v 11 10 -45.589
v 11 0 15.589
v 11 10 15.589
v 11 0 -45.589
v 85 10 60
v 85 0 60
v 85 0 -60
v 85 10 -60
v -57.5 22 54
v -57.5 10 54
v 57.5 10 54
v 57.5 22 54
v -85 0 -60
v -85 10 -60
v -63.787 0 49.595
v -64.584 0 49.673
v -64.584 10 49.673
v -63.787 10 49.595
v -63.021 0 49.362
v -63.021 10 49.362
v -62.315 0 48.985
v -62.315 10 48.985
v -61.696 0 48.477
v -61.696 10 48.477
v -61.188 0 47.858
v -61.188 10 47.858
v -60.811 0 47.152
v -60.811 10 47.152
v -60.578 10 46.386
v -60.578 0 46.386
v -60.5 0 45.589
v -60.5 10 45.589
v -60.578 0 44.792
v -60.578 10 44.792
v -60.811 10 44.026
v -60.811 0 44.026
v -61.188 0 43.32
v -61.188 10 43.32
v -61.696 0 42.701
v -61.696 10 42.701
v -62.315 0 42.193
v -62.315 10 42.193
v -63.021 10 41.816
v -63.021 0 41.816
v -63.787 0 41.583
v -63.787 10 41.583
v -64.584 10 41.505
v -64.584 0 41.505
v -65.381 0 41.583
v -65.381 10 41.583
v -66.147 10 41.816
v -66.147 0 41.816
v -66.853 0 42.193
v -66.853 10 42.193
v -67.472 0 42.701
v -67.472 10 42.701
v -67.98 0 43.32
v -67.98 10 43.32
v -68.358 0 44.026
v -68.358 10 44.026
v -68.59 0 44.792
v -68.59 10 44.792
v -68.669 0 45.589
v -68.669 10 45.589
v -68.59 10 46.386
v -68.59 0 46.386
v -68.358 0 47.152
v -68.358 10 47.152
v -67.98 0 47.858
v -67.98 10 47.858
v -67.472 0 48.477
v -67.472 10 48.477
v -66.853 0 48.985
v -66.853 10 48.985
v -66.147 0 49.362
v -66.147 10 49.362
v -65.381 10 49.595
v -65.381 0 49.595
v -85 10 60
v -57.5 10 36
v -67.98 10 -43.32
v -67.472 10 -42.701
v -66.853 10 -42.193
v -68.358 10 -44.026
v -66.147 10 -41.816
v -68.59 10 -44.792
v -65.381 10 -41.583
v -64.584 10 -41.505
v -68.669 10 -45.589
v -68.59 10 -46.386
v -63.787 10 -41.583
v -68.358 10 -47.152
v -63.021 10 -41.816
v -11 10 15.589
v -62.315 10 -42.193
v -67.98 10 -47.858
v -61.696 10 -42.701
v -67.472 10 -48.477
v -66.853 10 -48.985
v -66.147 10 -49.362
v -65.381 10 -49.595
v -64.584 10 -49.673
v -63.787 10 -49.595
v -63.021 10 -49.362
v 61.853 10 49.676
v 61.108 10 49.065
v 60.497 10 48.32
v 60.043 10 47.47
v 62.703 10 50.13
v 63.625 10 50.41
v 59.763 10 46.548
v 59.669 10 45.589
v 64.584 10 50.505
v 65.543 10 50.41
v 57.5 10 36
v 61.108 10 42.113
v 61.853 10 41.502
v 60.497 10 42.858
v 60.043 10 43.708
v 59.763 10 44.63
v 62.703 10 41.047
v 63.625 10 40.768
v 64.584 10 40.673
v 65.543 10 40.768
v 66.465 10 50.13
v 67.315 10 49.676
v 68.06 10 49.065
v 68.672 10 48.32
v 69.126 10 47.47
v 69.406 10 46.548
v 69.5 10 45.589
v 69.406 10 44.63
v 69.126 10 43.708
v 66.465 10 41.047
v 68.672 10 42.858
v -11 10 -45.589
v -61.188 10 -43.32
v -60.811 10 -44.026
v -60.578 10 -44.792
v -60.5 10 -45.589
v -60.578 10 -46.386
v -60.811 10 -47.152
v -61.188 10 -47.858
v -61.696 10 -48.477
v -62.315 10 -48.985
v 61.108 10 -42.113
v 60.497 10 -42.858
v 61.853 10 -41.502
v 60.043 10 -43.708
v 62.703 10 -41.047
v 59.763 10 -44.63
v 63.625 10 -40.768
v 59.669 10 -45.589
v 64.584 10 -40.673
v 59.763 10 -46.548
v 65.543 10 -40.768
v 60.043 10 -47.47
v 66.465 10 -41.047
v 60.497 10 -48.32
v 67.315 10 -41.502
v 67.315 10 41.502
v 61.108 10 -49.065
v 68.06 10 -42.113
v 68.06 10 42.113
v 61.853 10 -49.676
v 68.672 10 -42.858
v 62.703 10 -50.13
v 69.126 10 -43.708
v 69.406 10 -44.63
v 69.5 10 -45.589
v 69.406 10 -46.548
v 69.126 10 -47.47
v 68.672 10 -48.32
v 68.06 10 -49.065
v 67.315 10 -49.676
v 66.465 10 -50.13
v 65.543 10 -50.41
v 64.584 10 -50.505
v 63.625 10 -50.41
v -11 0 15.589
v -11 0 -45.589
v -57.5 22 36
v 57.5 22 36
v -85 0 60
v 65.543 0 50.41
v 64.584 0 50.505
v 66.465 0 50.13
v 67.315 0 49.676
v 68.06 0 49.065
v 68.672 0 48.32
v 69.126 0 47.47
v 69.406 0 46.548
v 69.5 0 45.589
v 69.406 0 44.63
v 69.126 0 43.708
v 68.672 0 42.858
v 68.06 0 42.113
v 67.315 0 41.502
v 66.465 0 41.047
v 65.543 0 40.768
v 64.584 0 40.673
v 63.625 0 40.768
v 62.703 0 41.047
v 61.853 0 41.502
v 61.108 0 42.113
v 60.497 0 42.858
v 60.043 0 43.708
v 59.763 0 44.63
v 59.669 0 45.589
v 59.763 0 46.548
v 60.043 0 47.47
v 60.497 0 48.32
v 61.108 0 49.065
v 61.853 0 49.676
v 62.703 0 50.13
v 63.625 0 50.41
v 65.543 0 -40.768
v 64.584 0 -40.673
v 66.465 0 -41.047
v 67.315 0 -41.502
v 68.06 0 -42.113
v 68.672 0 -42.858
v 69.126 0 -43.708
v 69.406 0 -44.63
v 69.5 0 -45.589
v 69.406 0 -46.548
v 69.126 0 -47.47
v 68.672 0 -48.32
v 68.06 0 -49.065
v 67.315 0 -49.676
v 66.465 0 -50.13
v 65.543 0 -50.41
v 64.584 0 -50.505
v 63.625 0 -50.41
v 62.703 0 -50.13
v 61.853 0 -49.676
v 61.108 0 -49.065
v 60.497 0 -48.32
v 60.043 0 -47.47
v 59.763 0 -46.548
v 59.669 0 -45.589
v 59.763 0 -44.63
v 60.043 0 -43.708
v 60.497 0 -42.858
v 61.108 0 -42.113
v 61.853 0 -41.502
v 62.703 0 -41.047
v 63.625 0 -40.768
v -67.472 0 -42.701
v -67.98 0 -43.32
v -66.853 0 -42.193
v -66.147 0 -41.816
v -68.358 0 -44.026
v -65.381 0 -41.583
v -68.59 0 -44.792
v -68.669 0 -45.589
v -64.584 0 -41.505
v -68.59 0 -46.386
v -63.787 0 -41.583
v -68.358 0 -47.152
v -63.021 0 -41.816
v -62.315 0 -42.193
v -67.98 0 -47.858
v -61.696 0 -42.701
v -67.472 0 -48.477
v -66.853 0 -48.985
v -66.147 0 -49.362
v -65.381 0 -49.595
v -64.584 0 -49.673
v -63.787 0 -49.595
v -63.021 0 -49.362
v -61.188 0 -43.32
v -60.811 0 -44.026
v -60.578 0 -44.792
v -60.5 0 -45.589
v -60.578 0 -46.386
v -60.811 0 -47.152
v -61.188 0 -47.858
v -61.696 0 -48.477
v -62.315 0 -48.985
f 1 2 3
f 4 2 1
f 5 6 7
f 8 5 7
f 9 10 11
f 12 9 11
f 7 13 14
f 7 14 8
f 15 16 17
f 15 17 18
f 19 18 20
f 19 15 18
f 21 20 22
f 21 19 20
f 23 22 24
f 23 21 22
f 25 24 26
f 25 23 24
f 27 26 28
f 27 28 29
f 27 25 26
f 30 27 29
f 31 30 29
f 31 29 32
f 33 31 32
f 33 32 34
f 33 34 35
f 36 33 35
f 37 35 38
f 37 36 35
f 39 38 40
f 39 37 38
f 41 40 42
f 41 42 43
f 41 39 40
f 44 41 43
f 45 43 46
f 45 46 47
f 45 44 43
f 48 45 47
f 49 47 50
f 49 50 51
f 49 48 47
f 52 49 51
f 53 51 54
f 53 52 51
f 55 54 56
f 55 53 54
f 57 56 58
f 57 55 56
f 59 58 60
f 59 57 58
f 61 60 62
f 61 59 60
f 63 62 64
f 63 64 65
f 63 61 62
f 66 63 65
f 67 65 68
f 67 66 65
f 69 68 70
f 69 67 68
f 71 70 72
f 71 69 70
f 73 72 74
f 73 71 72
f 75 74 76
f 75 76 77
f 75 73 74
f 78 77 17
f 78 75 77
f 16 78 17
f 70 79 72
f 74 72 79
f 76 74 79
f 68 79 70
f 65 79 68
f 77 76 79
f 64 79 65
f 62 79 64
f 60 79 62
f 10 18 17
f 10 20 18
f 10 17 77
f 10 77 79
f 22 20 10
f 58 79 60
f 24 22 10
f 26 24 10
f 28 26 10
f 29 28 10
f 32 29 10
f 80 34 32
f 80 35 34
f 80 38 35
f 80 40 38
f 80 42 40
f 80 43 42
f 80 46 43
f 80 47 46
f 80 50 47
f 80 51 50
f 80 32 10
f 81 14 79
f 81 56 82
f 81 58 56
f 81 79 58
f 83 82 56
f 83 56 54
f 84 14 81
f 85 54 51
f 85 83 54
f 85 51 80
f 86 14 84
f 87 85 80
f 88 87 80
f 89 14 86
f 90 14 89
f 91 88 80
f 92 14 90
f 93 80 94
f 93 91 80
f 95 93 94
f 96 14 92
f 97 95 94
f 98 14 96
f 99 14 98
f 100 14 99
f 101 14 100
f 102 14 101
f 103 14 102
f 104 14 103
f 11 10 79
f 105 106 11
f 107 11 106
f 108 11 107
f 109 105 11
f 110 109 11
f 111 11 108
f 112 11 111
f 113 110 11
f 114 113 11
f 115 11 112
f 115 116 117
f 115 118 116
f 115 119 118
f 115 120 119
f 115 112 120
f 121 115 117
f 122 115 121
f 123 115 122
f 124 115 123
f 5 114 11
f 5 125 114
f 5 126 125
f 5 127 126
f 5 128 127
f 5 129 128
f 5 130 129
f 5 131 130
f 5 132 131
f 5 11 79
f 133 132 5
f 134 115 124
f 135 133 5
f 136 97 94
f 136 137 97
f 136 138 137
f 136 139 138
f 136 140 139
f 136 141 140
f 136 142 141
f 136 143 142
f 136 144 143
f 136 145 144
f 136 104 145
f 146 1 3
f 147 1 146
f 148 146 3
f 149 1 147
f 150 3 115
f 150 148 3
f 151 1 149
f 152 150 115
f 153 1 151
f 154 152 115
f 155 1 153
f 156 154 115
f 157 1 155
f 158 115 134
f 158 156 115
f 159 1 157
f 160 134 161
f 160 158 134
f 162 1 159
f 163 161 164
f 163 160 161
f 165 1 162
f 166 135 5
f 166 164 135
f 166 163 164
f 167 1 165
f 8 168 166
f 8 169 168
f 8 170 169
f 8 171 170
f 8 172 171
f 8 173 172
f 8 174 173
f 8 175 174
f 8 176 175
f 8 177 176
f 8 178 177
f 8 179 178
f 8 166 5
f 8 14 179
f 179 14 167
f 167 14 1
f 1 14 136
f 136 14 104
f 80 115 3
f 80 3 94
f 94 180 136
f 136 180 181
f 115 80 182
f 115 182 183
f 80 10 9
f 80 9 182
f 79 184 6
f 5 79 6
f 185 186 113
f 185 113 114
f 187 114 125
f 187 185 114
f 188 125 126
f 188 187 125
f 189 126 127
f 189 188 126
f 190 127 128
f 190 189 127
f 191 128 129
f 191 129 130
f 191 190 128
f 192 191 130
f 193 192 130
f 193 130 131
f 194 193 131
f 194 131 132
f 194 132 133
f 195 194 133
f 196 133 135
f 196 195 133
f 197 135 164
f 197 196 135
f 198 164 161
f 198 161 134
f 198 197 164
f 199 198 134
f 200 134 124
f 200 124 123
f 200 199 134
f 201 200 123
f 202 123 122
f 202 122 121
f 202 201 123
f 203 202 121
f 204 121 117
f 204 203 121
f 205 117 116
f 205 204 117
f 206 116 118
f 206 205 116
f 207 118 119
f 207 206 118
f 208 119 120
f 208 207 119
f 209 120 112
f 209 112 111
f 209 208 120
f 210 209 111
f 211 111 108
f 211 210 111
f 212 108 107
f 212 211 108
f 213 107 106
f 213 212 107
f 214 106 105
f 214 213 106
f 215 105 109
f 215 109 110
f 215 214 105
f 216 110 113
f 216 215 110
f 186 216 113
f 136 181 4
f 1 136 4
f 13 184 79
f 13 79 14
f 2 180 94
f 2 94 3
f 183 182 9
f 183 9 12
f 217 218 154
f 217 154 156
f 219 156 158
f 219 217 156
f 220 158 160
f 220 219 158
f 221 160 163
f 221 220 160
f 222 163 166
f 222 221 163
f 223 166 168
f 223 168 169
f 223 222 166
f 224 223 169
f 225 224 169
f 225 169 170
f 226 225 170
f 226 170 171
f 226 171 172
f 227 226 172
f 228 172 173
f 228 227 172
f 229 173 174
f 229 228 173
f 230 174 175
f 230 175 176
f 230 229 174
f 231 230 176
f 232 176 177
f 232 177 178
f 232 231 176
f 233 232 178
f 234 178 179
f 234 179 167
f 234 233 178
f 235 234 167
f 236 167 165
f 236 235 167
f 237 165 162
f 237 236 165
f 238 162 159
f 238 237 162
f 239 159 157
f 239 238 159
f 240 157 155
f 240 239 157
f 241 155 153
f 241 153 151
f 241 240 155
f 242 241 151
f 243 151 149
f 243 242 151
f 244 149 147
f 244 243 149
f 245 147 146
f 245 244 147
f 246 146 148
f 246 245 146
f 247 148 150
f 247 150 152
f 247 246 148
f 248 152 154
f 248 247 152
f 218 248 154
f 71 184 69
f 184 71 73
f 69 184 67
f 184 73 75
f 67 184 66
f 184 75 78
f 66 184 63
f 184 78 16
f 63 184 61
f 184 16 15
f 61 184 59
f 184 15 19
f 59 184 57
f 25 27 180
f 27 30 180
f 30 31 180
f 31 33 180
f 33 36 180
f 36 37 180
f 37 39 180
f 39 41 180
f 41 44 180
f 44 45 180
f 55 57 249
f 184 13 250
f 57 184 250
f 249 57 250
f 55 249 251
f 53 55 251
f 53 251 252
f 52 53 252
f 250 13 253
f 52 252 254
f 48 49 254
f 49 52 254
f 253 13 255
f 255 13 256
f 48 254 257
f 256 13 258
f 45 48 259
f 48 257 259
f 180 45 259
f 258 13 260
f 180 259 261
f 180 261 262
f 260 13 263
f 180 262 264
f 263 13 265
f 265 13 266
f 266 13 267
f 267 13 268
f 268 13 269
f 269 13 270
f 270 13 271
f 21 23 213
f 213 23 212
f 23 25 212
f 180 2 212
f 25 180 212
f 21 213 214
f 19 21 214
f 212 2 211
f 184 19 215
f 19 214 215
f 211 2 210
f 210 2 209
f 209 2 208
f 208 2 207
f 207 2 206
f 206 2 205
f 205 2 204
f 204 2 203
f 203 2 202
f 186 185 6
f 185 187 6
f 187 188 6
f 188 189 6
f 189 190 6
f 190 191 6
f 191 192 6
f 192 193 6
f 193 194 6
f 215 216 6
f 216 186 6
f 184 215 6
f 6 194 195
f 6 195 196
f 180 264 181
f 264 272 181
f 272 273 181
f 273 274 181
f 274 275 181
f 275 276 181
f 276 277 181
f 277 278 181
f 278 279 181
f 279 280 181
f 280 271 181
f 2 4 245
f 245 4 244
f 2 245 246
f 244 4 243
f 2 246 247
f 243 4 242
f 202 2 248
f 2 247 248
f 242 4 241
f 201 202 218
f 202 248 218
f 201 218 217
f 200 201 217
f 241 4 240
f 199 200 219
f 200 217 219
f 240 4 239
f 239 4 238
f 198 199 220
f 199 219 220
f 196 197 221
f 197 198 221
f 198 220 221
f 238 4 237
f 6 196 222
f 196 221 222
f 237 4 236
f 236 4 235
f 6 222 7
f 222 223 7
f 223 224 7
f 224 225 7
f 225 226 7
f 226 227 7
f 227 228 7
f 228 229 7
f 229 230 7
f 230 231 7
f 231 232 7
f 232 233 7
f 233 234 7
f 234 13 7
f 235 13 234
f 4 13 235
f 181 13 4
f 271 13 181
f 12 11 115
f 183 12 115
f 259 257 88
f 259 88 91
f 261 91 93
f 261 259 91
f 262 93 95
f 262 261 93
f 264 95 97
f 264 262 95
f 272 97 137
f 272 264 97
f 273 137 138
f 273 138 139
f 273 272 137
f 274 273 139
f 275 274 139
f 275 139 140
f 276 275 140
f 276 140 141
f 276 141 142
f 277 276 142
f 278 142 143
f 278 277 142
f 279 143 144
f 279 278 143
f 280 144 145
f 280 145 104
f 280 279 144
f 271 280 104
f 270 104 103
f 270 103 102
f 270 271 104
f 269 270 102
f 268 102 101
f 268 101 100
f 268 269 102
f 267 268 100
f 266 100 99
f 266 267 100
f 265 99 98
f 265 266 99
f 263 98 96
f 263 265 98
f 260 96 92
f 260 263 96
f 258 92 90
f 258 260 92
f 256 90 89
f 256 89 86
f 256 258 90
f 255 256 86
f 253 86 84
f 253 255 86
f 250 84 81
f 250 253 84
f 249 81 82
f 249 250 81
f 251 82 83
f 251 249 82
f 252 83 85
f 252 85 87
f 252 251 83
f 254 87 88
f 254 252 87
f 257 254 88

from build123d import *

# Parameters (mm, degrees)
F_01_BASE_PROFILE_W           = 170
F_01_BASE_PROFILE_H           = 120
F_01_BASE_PROFILE_R           = 4.084295612
F_01_BASE_PROFILE_R_2         = 4.915704388
F_01_BASE_PROFILE_W_2         = 22
F_01_BASE_PROFILE_H_2         = 61.1778291
F_01_BASE_EXTRUDE_DEPTH       = 10
F_02_BOSS_PROFILE_W           = 115
F_02_BOSS_PROFILE_H           = 18
F_02_REINFORCEMENT_BOSS_DEPTH = 22


with BuildPart() as part:
    # 01_Base_Profile → 01_Base_Extrude (new body)
    with BuildSketch(Plane(origin=(0, 0, 0), x_dir=(1, 0, 0), z_dir=(0, 1, 0))):
        Rectangle(F_01_BASE_PROFILE_W, F_01_BASE_PROFILE_H)
        with Locations(Location((-64.584295612, -45.58891455, 0), (0, 0, 270))):
            Circle(F_01_BASE_PROFILE_R, mode=Mode.SUBTRACT)
        with Locations(Location((64.584295612, -45.58891455, 0), (0, 0, 270))):
            Circle(F_01_BASE_PROFILE_R_2, mode=Mode.SUBTRACT)
        with Locations(Location((-64.584295612, 45.58891455, 0), (0, 0, 270))):
            Circle(F_01_BASE_PROFILE_R, mode=Mode.SUBTRACT)
        with Locations(Location((64.584295612, 45.58891455, 0), (0, 0, 270))):
            Circle(F_01_BASE_PROFILE_R_2, mode=Mode.SUBTRACT)
        with Locations((0, 15)):
            Rectangle(F_01_BASE_PROFILE_W_2, F_01_BASE_PROFILE_H_2, mode=Mode.SUBTRACT)
    extrude(amount=F_01_BASE_EXTRUDE_DEPTH)

    # 02_Boss_Profile → 02_Reinforcement_Boss (add)
    with BuildSketch(Plane(origin=(0, 0, 0), x_dir=(1, 0, 0), z_dir=(0, 1, 0))):
        with Locations((0, -45)):
            Rectangle(F_02_BOSS_PROFILE_W, F_02_BOSS_PROFILE_H)
    extrude(amount=F_02_REINFORCEMENT_BOSS_DEPTH)


solid = part.part
